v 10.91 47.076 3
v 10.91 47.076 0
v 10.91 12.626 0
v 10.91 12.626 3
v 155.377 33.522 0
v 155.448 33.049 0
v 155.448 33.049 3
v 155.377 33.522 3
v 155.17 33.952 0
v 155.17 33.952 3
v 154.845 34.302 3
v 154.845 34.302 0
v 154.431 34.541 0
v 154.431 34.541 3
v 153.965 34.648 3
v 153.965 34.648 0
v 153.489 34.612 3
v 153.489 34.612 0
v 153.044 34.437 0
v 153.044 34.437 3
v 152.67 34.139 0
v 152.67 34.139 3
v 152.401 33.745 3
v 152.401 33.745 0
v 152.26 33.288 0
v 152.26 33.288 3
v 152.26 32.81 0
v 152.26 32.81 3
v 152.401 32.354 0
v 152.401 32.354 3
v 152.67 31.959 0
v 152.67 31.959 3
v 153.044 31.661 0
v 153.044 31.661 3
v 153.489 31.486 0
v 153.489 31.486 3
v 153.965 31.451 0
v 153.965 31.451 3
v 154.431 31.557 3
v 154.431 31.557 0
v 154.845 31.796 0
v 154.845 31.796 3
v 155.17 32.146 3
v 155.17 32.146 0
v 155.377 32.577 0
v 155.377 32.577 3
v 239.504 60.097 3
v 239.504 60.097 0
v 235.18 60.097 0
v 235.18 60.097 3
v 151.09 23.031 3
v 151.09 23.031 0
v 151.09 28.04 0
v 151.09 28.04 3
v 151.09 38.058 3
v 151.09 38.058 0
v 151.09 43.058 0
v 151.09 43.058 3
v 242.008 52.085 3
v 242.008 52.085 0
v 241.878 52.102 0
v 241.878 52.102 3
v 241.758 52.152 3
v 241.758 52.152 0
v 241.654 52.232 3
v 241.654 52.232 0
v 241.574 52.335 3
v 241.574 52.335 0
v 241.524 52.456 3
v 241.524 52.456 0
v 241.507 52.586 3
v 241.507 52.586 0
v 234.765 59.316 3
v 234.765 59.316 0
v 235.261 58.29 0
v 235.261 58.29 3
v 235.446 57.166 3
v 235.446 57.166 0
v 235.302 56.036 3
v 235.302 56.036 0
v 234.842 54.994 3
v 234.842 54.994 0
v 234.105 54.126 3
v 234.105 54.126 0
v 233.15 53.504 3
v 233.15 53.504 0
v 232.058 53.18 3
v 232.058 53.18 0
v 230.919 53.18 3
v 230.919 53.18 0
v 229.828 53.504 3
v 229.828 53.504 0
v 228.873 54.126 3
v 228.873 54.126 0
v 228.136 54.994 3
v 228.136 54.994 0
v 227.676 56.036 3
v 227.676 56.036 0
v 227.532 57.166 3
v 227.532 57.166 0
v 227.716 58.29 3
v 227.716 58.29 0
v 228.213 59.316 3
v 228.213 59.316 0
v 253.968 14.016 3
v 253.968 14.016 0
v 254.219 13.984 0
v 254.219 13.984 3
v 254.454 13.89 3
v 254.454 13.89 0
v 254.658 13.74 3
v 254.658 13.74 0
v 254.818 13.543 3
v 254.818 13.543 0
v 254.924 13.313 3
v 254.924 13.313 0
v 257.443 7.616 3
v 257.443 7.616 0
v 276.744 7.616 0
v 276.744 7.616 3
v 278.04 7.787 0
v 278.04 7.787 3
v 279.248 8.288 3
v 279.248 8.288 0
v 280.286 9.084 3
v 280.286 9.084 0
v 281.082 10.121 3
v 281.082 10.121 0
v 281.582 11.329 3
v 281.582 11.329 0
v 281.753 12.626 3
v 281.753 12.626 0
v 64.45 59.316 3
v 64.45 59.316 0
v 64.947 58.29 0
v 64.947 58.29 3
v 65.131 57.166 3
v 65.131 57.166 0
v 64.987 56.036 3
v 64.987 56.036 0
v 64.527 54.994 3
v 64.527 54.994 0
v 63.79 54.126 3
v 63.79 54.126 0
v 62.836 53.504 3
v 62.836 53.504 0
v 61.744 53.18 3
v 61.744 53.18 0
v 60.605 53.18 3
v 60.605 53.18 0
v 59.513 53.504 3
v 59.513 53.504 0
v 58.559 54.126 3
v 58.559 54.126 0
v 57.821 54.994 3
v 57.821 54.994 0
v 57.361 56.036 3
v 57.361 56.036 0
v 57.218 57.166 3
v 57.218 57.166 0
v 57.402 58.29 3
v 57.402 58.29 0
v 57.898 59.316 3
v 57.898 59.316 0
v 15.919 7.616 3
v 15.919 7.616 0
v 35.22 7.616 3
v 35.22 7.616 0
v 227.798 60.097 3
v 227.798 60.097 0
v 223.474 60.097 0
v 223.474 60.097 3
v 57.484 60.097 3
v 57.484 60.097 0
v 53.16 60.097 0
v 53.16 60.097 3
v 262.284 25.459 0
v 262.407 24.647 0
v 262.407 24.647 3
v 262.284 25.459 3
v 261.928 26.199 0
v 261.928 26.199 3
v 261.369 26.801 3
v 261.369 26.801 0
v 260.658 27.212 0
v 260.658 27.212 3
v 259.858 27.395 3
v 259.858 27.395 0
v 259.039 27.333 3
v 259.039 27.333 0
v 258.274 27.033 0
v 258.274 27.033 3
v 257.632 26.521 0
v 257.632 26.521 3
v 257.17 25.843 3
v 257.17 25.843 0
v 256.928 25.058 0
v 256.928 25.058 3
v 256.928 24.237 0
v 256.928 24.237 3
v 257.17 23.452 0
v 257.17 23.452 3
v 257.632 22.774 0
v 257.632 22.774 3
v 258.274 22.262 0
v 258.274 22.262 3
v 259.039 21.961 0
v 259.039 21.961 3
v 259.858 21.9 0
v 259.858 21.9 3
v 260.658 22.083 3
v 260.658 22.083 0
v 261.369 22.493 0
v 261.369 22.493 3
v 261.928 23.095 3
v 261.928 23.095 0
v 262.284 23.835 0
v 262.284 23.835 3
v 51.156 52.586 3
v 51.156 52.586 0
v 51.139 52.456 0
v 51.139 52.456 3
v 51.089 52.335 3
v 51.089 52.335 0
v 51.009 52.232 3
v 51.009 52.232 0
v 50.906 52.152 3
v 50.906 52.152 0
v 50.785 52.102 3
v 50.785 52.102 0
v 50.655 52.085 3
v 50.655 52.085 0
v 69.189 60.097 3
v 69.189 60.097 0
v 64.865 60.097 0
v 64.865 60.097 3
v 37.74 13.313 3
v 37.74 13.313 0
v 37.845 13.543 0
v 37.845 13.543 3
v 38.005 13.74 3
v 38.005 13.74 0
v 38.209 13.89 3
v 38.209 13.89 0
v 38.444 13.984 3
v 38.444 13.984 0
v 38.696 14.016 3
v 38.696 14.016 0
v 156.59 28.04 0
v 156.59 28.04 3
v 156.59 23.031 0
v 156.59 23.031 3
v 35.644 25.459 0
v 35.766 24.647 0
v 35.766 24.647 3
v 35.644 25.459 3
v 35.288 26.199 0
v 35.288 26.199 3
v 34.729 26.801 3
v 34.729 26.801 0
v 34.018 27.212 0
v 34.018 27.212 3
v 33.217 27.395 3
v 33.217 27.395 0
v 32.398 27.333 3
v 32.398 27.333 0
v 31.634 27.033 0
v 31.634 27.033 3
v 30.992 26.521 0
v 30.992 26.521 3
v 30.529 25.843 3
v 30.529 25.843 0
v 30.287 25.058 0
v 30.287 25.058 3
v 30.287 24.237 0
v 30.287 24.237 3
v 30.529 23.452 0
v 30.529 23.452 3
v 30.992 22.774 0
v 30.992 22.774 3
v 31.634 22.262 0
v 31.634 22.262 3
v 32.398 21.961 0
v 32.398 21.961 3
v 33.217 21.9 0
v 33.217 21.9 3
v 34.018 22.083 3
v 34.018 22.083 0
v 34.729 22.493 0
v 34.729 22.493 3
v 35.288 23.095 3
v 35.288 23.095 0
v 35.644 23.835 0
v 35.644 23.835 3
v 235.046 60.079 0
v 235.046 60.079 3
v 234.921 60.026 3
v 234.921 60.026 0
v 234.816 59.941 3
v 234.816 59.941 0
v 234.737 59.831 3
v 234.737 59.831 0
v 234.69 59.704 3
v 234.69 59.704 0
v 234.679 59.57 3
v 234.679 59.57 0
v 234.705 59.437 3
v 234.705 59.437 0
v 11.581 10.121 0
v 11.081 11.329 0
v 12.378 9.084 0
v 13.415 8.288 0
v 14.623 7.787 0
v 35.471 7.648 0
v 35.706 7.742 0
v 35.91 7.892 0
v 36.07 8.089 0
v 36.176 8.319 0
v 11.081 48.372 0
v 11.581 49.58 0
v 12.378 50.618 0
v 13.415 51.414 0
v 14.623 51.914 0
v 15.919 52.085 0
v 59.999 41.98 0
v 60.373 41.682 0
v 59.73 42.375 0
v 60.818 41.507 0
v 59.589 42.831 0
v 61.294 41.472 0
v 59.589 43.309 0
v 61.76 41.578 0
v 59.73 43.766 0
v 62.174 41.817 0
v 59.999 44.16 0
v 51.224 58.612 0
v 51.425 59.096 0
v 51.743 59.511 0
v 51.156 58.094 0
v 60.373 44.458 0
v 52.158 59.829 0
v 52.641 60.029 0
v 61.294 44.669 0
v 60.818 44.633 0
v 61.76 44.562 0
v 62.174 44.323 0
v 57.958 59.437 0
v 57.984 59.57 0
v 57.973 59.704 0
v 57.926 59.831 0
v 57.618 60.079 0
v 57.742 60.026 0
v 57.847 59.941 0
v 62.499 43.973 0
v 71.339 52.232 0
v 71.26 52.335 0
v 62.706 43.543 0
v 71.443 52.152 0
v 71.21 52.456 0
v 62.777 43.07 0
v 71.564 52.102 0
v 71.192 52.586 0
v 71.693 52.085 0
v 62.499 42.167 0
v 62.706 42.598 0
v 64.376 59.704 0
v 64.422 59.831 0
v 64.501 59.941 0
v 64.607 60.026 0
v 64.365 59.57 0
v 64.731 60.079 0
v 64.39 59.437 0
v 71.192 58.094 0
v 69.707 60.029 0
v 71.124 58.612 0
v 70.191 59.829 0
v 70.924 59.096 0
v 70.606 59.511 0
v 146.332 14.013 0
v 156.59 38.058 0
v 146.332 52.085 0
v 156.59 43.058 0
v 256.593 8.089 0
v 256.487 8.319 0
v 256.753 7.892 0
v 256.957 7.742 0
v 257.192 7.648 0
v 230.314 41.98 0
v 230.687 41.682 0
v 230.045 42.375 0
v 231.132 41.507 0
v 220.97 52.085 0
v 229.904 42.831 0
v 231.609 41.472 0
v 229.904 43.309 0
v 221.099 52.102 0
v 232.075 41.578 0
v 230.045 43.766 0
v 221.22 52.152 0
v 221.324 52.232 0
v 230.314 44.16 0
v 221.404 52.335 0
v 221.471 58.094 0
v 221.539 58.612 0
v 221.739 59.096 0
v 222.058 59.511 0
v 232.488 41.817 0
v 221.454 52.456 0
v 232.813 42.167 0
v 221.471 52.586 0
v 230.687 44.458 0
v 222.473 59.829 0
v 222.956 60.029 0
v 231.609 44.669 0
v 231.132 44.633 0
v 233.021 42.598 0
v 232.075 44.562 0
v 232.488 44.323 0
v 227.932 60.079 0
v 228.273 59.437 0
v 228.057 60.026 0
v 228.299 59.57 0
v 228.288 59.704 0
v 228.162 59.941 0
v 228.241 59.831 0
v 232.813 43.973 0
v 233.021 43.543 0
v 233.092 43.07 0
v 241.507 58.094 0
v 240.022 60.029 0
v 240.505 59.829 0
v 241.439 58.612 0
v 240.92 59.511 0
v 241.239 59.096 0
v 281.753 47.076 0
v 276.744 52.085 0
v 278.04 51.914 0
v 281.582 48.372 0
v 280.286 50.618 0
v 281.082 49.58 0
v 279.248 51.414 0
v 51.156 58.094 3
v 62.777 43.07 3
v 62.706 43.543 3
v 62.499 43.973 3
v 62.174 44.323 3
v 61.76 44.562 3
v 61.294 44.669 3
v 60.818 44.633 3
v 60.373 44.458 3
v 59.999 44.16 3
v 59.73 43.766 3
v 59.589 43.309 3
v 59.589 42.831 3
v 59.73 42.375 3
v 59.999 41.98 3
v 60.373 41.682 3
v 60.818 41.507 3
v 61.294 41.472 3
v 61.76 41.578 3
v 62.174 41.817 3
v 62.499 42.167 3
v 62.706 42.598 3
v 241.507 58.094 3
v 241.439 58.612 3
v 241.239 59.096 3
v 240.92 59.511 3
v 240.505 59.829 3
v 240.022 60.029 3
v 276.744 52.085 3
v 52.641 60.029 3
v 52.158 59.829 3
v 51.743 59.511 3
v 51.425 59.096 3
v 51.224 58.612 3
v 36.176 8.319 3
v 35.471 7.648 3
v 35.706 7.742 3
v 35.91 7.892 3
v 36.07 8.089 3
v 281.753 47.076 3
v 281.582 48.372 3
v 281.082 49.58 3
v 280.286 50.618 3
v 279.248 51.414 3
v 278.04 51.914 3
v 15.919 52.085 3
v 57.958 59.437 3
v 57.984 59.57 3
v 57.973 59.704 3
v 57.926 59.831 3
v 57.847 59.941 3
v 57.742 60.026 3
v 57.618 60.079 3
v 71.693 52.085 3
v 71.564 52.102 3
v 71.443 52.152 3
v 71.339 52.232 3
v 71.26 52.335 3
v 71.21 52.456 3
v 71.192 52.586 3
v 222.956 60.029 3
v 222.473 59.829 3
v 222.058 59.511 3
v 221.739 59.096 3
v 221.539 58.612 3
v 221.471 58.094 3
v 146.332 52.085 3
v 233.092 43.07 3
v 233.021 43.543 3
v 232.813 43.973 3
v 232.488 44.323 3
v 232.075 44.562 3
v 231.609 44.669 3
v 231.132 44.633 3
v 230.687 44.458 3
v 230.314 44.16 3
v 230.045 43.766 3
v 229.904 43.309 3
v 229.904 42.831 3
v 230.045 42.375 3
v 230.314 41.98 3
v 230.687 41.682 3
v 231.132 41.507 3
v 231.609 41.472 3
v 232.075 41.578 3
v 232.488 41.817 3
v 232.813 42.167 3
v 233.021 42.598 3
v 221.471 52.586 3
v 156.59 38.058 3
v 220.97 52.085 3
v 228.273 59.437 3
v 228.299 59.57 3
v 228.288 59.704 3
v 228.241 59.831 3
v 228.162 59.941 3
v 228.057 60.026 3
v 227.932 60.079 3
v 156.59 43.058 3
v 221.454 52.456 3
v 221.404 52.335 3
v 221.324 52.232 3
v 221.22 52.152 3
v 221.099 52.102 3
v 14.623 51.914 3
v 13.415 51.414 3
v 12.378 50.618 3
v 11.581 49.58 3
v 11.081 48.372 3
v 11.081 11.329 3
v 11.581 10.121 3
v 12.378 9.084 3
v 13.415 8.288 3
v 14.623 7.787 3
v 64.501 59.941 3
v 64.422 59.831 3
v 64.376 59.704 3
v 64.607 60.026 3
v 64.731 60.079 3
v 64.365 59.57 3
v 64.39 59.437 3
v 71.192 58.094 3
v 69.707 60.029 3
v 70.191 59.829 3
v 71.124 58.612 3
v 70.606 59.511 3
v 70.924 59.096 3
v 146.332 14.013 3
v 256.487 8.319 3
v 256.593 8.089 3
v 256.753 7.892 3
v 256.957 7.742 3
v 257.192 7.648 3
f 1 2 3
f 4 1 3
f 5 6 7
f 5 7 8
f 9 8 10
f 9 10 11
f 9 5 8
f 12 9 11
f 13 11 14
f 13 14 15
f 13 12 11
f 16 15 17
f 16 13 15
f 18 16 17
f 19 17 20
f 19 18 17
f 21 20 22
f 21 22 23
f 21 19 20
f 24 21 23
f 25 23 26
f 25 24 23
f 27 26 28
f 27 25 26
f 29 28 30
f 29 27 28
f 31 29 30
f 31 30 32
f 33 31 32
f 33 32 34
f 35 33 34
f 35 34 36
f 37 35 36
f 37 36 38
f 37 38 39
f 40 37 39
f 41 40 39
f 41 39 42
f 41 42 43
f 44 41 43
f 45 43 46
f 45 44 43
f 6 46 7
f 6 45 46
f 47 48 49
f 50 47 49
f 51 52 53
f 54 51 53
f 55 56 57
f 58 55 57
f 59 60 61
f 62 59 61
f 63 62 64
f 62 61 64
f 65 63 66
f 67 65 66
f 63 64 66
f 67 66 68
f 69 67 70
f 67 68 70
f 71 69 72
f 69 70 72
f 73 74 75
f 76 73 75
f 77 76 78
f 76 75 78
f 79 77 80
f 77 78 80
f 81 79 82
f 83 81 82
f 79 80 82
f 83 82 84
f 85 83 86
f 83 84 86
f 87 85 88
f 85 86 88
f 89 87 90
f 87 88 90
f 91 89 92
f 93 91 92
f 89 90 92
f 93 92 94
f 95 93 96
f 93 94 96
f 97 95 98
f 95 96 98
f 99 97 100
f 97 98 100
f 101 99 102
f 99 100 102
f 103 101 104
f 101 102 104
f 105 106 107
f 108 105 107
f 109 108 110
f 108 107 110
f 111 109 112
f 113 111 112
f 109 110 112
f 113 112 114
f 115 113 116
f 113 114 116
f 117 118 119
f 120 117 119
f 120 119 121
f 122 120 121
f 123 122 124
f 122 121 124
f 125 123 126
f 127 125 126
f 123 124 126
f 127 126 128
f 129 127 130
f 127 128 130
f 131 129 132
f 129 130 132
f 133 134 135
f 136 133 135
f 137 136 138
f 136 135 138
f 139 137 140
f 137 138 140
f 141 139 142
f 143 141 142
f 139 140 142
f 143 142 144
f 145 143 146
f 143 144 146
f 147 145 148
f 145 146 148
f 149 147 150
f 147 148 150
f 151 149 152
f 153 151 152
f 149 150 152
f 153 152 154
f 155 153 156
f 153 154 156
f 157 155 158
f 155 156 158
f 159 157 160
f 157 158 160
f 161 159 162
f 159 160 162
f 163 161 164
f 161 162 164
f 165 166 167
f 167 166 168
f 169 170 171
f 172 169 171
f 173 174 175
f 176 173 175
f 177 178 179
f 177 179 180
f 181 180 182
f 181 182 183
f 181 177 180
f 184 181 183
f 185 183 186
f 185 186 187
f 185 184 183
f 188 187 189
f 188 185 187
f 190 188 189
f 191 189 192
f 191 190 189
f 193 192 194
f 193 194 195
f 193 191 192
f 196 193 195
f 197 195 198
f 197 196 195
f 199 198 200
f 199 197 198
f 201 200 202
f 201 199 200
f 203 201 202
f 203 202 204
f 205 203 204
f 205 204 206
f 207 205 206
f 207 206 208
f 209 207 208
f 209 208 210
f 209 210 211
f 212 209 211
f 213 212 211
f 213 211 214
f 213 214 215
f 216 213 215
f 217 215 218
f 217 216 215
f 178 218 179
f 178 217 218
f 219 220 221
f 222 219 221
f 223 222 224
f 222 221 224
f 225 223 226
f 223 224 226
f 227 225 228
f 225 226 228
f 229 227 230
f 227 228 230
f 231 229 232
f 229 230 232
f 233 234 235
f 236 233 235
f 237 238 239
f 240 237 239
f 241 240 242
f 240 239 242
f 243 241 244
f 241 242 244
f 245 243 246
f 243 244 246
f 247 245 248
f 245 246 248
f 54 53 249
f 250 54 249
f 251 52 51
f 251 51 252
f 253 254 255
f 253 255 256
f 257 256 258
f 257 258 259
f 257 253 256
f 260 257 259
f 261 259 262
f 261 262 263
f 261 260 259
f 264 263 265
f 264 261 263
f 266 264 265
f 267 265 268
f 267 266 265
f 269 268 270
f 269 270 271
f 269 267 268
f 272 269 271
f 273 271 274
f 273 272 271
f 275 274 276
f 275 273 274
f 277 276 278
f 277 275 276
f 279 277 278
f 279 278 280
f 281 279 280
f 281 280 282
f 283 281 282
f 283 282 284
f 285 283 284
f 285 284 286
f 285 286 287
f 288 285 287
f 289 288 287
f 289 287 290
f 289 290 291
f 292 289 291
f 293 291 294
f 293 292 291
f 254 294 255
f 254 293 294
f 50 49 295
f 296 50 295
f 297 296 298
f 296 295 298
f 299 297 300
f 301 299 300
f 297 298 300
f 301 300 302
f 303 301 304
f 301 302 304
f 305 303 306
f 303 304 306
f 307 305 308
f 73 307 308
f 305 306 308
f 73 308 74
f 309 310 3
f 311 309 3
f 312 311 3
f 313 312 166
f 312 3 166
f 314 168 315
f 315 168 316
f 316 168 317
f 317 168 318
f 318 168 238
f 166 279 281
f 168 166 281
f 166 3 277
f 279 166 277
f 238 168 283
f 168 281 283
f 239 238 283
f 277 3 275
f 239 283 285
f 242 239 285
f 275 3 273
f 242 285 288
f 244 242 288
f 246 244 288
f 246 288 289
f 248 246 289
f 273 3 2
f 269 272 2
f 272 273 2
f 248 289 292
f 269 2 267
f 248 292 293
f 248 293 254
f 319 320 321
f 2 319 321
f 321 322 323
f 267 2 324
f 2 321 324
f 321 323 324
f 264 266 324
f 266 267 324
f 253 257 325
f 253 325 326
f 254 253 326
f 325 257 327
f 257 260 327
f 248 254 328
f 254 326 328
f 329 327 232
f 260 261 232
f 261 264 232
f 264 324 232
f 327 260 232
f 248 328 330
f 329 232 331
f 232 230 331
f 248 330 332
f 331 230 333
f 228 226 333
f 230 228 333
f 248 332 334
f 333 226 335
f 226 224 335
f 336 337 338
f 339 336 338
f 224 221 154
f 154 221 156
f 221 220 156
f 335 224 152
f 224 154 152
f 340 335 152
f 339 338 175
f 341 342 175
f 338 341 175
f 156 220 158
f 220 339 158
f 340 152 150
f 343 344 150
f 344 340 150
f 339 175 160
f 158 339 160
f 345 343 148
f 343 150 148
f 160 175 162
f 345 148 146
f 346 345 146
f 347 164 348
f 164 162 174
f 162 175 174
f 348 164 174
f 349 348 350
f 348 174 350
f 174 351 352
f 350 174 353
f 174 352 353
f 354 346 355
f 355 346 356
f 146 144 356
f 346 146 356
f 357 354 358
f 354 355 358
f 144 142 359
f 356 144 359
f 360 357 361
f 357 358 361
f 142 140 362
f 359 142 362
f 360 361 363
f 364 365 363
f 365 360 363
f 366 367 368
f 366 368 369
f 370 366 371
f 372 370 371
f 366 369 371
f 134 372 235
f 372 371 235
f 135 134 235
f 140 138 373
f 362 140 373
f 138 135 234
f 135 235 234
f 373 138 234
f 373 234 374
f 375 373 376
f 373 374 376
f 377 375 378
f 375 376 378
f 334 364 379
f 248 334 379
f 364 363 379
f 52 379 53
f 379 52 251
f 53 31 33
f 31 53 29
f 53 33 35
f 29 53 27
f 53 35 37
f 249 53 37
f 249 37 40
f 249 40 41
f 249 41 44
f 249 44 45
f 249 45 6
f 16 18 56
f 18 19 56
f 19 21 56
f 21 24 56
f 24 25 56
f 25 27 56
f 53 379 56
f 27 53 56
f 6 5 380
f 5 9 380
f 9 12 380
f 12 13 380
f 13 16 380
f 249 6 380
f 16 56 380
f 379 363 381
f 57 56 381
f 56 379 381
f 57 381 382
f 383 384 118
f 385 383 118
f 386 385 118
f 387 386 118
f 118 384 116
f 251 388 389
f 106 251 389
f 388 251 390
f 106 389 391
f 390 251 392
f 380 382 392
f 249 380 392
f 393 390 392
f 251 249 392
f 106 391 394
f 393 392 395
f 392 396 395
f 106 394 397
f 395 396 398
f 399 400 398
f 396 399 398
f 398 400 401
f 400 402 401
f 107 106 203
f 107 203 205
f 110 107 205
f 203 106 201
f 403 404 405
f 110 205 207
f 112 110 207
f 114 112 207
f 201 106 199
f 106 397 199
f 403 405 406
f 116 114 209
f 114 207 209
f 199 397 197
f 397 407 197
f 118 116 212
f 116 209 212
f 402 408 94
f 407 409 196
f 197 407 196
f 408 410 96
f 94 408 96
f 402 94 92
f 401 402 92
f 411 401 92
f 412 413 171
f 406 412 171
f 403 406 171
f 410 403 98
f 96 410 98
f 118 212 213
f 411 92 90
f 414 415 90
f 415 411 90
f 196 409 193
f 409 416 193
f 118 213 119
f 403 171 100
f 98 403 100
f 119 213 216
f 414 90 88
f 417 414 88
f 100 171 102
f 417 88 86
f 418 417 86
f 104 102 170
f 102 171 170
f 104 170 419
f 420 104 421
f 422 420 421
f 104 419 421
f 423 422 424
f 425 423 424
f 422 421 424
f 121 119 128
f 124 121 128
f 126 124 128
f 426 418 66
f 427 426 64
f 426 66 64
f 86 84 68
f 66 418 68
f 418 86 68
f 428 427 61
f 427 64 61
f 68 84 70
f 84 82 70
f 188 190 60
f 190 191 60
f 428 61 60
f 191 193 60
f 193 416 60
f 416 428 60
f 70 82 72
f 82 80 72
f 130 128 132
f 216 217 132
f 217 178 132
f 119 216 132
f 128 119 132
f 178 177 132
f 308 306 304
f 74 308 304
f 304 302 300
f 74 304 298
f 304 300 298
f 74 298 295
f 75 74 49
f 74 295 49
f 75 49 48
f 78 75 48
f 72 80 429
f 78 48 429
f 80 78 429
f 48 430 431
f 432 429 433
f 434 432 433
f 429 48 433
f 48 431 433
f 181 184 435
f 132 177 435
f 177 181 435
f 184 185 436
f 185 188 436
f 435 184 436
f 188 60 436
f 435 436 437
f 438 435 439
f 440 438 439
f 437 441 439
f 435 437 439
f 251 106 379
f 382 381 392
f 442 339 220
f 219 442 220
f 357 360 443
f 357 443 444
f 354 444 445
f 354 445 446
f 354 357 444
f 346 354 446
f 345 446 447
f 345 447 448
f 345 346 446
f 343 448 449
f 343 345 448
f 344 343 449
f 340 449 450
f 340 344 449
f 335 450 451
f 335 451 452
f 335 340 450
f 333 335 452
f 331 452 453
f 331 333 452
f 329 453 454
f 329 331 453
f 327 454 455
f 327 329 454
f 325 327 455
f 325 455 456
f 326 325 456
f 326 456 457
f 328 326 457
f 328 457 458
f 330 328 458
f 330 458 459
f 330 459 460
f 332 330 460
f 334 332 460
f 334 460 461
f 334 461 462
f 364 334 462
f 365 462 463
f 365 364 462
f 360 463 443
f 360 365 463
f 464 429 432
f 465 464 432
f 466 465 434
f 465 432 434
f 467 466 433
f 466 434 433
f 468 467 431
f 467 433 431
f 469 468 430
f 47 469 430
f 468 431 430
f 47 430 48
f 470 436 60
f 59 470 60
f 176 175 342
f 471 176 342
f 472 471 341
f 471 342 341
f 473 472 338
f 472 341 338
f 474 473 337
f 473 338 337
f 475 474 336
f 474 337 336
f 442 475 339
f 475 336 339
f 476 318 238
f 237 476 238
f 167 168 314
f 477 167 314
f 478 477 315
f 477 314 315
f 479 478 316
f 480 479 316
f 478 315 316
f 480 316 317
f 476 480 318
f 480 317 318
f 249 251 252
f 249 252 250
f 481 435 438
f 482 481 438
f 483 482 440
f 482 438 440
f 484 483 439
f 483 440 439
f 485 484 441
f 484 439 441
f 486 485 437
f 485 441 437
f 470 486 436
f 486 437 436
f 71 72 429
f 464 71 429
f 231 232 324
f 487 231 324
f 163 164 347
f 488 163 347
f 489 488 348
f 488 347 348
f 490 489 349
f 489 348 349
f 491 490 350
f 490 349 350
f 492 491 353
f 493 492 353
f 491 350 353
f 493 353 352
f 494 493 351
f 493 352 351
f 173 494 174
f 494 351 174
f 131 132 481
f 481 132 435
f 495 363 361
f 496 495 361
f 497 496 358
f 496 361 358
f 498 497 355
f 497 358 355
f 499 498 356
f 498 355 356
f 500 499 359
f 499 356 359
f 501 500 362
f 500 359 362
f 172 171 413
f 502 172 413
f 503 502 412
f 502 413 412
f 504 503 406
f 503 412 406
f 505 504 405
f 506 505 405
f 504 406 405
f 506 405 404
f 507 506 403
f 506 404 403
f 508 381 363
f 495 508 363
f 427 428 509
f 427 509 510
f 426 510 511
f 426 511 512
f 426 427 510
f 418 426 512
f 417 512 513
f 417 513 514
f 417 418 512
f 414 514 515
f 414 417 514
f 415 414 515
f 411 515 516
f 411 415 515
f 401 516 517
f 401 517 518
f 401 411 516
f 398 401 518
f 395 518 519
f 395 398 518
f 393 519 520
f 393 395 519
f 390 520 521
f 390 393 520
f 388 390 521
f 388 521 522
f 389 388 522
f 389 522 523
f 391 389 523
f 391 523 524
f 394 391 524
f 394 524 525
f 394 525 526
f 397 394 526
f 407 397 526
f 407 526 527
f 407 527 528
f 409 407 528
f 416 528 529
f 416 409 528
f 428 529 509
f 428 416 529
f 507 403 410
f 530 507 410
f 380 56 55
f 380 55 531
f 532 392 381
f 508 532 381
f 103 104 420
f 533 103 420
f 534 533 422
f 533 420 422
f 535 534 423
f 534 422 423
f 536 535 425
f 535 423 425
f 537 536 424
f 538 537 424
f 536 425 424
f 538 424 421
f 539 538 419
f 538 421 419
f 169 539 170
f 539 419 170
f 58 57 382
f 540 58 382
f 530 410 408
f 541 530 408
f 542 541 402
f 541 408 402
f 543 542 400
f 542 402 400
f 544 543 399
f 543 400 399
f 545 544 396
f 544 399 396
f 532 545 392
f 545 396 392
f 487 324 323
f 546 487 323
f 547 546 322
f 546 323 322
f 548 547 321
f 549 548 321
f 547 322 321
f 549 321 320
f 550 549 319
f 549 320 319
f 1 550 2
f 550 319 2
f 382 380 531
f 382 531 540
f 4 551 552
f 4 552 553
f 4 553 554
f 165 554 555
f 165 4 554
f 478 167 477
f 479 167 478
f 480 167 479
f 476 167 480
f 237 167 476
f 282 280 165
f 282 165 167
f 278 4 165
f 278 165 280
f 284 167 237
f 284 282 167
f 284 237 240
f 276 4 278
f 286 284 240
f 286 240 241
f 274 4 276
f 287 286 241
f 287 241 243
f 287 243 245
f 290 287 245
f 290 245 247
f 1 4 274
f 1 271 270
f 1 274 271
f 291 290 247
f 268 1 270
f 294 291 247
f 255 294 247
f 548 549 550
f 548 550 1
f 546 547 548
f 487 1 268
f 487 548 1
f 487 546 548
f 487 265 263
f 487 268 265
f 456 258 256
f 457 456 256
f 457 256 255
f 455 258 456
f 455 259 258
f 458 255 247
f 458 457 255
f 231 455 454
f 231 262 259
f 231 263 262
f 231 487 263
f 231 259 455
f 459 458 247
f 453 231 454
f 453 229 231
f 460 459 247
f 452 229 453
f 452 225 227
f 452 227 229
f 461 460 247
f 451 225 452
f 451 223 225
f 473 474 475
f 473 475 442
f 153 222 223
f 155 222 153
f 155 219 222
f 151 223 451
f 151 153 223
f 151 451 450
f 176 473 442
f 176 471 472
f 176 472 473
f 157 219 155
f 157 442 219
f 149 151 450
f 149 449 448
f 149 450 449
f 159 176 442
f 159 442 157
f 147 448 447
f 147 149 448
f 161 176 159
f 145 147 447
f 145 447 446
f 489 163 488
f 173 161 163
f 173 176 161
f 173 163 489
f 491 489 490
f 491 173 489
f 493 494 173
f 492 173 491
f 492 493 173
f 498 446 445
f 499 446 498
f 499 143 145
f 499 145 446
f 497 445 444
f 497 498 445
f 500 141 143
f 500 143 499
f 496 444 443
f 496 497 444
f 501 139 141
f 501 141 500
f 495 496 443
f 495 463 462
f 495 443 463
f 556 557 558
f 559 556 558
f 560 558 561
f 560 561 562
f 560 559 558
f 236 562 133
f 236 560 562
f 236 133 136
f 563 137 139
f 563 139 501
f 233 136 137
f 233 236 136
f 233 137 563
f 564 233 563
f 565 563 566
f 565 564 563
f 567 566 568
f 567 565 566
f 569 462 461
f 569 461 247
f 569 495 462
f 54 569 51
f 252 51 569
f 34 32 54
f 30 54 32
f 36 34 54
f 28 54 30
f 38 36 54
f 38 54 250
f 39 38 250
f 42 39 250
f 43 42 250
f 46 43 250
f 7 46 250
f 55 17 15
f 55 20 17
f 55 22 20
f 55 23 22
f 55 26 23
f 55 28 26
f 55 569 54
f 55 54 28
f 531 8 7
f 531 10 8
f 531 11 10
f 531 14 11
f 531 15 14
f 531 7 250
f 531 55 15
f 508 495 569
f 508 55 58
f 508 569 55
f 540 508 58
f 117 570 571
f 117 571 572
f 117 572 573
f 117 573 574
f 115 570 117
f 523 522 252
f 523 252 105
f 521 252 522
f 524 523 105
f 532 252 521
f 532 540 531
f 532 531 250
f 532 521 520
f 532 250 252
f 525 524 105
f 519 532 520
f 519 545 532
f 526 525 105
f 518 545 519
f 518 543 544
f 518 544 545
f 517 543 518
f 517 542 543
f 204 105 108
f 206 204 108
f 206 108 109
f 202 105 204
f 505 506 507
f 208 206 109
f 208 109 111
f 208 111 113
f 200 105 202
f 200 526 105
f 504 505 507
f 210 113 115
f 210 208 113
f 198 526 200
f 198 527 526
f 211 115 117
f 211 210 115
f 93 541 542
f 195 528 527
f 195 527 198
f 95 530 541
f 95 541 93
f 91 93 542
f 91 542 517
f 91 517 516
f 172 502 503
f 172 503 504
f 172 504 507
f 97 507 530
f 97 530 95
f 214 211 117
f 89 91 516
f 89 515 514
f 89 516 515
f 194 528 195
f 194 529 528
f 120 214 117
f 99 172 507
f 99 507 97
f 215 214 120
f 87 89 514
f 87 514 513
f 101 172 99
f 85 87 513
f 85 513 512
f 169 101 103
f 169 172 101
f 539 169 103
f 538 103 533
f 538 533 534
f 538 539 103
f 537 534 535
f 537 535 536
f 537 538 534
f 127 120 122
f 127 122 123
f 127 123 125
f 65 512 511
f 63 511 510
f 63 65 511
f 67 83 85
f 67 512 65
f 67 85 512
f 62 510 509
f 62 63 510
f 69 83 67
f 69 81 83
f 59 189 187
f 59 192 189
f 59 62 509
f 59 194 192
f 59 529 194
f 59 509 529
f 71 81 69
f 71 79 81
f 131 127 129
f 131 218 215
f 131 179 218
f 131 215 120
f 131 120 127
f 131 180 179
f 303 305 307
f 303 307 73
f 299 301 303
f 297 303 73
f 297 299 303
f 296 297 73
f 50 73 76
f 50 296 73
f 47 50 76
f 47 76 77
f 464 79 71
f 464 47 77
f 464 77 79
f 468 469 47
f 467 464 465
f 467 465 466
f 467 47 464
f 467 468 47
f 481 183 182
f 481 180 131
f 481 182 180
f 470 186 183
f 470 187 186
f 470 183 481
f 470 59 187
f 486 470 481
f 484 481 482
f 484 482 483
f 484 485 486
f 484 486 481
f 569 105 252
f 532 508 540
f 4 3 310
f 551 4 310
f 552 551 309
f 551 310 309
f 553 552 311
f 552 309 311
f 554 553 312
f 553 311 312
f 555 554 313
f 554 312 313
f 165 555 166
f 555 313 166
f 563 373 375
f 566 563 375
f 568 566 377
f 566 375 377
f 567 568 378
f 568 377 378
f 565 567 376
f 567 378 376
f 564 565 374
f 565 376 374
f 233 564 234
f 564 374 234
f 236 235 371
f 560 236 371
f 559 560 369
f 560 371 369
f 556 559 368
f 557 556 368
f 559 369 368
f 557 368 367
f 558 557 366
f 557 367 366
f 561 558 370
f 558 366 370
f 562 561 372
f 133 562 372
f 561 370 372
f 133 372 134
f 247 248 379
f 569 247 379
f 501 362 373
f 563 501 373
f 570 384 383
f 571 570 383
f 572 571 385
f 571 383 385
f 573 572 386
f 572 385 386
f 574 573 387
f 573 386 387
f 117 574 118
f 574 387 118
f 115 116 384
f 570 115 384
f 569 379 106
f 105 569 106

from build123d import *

# Parameters (mm, degrees)
MODEL_R                 = 1.60291439
MODEL_R_2               = 2.755009107
MODEL_W                 = 5.5
MODEL_H                 = 5
MODEL_H_2               = 5.009107468
SALIENTE_EXTRUIR1_DEPTH = 3


with BuildPart() as part:
    # Model → Saliente-Extruir1 (new body)
    with BuildSketch(Plane.XY):
        with BuildLine():
            Line((146.331612735, 52.084906554), (71.693408409, 52.084905051))
            ThreePointArc((71.693408409, 52.084905051), (71.339211023, 52.231618412), (71.192497662, 52.585815798))
            Line((71.192497662, 52.585815798), (71.192497662, 58.093853412))
            ThreePointArc((71.192497662, 58.093853412), (70.605644218, 59.510642955), (69.188854675, 60.097496399))
            Line((69.188854675, 60.097496399), (64.864840233, 60.097496399))
            ThreePointArc((64.864840233, 60.097496399), (64.422309224, 59.831272426), (64.45017085, 59.315585867))
            ThreePointArc((64.45017085, 59.315585867), (61.174282726, 53.138492666), (57.898394601, 59.315585867))
            ThreePointArc((57.898394601, 59.315585867), (57.926256228, 59.831272427), (57.483725218, 60.097496399))
            Line((57.483725218, 60.097496399), (53.159710777, 60.097496399))
            ThreePointArc((53.159710777, 60.097496399), (51.742921234, 59.510642955), (51.15606779, 58.093853412))
            Line((51.15606779, 58.093853412), (51.15606779, 52.585818804))
            ThreePointArc((51.15606779, 52.585818804), (51.009354429, 52.231621418), (50.655157043, 52.084908057))
            Line((50.655157043, 52.084908057), (20.928604766, 52.084908057))
            Line((20.928604766, 52.084908057), (15.919497298, 52.084908057))
            ThreePointArc((15.919497298, 52.084908057), (12.37752344, 50.617774447), (10.91038983, 47.075800589))
            Line((10.91038983, 47.075800589), (10.91038983, 12.625568804))
            ThreePointArc((10.91038983, 12.625568804), (12.377524274, 9.083594111), (15.919499658, 7.616461335))
            Line((15.919499658, 7.616461335), (35.219821515, 7.616461335))
            ThreePointArc((35.219821515, 7.616461335), (35.81301385, 7.810960614), (36.17587477, 8.318936073))
            Line((36.17587477, 8.318936073), (37.739622557, 13.313231589))
            ThreePointArc((37.739622557, 13.313231589), (38.102483477, 13.821207048), (38.695675812, 14.015706326))
            Line((38.695675812, 14.015706326), (146.331612735, 14.013271547))
            Line((146.331612735, 14.013271547), (253.967549659, 14.015706326))
            ThreePointArc((253.967549659, 14.015706326), (254.560741993, 13.821207048), (254.923602913, 13.313231589))
            Line((254.923602913, 13.313231589), (256.487350701, 8.318936073))
            ThreePointArc((256.487350701, 8.318936073), (256.85021162, 7.810960614), (257.443403955, 7.616461335))
            Line((257.443403955, 7.616461335), (276.743725812, 7.616461335))
            ThreePointArc((276.743725812, 7.616461335), (280.285701196, 9.083594111), (281.75283564, 12.625568804))
            Line((281.75283564, 12.625568804), (281.75283564, 47.075800589))
            ThreePointArc((281.75283564, 47.075800589), (280.285702031, 50.617774447), (276.743728172, 52.084908057))
            Line((276.743728172, 52.084908057), (271.734620704, 52.084908057))
            Line((271.734620704, 52.084908057), (242.008068427, 52.084908057))
            ThreePointArc((242.008068427, 52.084908057), (241.653871041, 52.231621418), (241.50715768, 52.585818804))
            Line((241.50715768, 52.585818804), (241.50715768, 58.093853412))
            ThreePointArc((241.50715768, 58.093853412), (240.920304237, 59.510642955), (239.503514693, 60.097496399))
            Line((239.503514693, 60.097496399), (235.179500252, 60.097496399))
            ThreePointArc((235.179500252, 60.097496399), (234.736969242, 59.831272427), (234.764830869, 59.315585867))
            ThreePointArc((234.764830869, 59.315585867), (231.488942744, 53.138492666), (228.21305462, 59.315585867))
            ThreePointArc((228.21305462, 59.315585867), (228.240916247, 59.831272426), (227.798385238, 60.097496399))
            Line((227.798385238, 60.097496399), (223.474370795, 60.097496399))
            ThreePointArc((223.474370795, 60.097496399), (222.057581252, 59.510642955), (221.470727808, 58.093853412))
            Line((221.470727808, 58.093853412), (221.470727808, 52.585815798))
            ThreePointArc((221.470727808, 52.585815798), (221.324014447, 52.231618412), (220.969817061, 52.084905051))
            Line((220.969817061, 52.084905051), (146.331612735, 52.084906554))
        make_face()
        with Locations((61.174282726, 43.070186654)):
            Circle(MODEL_R, mode=Mode.SUBTRACT)
        with Locations((231.488942744, 43.070186654)):
            Circle(MODEL_R, mode=Mode.SUBTRACT)
        with Locations((153.845273937, 33.04908905)):
            Circle(MODEL_R, mode=Mode.SUBTRACT)
        with Locations((33.011476123, 24.647426727)):
            Circle(MODEL_R_2, mode=Mode.SUBTRACT)
        with Locations((259.651749347, 24.647426727)):
            Circle(MODEL_R_2, mode=Mode.SUBTRACT)
        with Locations((153.84026483, 40.558196518)):
            Rectangle(MODEL_W, MODEL_H, mode=Mode.SUBTRACT)
        with Locations((153.84026483, 25.535427848)):
            Rectangle(MODEL_W, MODEL_H_2, mode=Mode.SUBTRACT)
    extrude(amount=SALIENTE_EXTRUIR1_DEPTH)


solid = part.part
